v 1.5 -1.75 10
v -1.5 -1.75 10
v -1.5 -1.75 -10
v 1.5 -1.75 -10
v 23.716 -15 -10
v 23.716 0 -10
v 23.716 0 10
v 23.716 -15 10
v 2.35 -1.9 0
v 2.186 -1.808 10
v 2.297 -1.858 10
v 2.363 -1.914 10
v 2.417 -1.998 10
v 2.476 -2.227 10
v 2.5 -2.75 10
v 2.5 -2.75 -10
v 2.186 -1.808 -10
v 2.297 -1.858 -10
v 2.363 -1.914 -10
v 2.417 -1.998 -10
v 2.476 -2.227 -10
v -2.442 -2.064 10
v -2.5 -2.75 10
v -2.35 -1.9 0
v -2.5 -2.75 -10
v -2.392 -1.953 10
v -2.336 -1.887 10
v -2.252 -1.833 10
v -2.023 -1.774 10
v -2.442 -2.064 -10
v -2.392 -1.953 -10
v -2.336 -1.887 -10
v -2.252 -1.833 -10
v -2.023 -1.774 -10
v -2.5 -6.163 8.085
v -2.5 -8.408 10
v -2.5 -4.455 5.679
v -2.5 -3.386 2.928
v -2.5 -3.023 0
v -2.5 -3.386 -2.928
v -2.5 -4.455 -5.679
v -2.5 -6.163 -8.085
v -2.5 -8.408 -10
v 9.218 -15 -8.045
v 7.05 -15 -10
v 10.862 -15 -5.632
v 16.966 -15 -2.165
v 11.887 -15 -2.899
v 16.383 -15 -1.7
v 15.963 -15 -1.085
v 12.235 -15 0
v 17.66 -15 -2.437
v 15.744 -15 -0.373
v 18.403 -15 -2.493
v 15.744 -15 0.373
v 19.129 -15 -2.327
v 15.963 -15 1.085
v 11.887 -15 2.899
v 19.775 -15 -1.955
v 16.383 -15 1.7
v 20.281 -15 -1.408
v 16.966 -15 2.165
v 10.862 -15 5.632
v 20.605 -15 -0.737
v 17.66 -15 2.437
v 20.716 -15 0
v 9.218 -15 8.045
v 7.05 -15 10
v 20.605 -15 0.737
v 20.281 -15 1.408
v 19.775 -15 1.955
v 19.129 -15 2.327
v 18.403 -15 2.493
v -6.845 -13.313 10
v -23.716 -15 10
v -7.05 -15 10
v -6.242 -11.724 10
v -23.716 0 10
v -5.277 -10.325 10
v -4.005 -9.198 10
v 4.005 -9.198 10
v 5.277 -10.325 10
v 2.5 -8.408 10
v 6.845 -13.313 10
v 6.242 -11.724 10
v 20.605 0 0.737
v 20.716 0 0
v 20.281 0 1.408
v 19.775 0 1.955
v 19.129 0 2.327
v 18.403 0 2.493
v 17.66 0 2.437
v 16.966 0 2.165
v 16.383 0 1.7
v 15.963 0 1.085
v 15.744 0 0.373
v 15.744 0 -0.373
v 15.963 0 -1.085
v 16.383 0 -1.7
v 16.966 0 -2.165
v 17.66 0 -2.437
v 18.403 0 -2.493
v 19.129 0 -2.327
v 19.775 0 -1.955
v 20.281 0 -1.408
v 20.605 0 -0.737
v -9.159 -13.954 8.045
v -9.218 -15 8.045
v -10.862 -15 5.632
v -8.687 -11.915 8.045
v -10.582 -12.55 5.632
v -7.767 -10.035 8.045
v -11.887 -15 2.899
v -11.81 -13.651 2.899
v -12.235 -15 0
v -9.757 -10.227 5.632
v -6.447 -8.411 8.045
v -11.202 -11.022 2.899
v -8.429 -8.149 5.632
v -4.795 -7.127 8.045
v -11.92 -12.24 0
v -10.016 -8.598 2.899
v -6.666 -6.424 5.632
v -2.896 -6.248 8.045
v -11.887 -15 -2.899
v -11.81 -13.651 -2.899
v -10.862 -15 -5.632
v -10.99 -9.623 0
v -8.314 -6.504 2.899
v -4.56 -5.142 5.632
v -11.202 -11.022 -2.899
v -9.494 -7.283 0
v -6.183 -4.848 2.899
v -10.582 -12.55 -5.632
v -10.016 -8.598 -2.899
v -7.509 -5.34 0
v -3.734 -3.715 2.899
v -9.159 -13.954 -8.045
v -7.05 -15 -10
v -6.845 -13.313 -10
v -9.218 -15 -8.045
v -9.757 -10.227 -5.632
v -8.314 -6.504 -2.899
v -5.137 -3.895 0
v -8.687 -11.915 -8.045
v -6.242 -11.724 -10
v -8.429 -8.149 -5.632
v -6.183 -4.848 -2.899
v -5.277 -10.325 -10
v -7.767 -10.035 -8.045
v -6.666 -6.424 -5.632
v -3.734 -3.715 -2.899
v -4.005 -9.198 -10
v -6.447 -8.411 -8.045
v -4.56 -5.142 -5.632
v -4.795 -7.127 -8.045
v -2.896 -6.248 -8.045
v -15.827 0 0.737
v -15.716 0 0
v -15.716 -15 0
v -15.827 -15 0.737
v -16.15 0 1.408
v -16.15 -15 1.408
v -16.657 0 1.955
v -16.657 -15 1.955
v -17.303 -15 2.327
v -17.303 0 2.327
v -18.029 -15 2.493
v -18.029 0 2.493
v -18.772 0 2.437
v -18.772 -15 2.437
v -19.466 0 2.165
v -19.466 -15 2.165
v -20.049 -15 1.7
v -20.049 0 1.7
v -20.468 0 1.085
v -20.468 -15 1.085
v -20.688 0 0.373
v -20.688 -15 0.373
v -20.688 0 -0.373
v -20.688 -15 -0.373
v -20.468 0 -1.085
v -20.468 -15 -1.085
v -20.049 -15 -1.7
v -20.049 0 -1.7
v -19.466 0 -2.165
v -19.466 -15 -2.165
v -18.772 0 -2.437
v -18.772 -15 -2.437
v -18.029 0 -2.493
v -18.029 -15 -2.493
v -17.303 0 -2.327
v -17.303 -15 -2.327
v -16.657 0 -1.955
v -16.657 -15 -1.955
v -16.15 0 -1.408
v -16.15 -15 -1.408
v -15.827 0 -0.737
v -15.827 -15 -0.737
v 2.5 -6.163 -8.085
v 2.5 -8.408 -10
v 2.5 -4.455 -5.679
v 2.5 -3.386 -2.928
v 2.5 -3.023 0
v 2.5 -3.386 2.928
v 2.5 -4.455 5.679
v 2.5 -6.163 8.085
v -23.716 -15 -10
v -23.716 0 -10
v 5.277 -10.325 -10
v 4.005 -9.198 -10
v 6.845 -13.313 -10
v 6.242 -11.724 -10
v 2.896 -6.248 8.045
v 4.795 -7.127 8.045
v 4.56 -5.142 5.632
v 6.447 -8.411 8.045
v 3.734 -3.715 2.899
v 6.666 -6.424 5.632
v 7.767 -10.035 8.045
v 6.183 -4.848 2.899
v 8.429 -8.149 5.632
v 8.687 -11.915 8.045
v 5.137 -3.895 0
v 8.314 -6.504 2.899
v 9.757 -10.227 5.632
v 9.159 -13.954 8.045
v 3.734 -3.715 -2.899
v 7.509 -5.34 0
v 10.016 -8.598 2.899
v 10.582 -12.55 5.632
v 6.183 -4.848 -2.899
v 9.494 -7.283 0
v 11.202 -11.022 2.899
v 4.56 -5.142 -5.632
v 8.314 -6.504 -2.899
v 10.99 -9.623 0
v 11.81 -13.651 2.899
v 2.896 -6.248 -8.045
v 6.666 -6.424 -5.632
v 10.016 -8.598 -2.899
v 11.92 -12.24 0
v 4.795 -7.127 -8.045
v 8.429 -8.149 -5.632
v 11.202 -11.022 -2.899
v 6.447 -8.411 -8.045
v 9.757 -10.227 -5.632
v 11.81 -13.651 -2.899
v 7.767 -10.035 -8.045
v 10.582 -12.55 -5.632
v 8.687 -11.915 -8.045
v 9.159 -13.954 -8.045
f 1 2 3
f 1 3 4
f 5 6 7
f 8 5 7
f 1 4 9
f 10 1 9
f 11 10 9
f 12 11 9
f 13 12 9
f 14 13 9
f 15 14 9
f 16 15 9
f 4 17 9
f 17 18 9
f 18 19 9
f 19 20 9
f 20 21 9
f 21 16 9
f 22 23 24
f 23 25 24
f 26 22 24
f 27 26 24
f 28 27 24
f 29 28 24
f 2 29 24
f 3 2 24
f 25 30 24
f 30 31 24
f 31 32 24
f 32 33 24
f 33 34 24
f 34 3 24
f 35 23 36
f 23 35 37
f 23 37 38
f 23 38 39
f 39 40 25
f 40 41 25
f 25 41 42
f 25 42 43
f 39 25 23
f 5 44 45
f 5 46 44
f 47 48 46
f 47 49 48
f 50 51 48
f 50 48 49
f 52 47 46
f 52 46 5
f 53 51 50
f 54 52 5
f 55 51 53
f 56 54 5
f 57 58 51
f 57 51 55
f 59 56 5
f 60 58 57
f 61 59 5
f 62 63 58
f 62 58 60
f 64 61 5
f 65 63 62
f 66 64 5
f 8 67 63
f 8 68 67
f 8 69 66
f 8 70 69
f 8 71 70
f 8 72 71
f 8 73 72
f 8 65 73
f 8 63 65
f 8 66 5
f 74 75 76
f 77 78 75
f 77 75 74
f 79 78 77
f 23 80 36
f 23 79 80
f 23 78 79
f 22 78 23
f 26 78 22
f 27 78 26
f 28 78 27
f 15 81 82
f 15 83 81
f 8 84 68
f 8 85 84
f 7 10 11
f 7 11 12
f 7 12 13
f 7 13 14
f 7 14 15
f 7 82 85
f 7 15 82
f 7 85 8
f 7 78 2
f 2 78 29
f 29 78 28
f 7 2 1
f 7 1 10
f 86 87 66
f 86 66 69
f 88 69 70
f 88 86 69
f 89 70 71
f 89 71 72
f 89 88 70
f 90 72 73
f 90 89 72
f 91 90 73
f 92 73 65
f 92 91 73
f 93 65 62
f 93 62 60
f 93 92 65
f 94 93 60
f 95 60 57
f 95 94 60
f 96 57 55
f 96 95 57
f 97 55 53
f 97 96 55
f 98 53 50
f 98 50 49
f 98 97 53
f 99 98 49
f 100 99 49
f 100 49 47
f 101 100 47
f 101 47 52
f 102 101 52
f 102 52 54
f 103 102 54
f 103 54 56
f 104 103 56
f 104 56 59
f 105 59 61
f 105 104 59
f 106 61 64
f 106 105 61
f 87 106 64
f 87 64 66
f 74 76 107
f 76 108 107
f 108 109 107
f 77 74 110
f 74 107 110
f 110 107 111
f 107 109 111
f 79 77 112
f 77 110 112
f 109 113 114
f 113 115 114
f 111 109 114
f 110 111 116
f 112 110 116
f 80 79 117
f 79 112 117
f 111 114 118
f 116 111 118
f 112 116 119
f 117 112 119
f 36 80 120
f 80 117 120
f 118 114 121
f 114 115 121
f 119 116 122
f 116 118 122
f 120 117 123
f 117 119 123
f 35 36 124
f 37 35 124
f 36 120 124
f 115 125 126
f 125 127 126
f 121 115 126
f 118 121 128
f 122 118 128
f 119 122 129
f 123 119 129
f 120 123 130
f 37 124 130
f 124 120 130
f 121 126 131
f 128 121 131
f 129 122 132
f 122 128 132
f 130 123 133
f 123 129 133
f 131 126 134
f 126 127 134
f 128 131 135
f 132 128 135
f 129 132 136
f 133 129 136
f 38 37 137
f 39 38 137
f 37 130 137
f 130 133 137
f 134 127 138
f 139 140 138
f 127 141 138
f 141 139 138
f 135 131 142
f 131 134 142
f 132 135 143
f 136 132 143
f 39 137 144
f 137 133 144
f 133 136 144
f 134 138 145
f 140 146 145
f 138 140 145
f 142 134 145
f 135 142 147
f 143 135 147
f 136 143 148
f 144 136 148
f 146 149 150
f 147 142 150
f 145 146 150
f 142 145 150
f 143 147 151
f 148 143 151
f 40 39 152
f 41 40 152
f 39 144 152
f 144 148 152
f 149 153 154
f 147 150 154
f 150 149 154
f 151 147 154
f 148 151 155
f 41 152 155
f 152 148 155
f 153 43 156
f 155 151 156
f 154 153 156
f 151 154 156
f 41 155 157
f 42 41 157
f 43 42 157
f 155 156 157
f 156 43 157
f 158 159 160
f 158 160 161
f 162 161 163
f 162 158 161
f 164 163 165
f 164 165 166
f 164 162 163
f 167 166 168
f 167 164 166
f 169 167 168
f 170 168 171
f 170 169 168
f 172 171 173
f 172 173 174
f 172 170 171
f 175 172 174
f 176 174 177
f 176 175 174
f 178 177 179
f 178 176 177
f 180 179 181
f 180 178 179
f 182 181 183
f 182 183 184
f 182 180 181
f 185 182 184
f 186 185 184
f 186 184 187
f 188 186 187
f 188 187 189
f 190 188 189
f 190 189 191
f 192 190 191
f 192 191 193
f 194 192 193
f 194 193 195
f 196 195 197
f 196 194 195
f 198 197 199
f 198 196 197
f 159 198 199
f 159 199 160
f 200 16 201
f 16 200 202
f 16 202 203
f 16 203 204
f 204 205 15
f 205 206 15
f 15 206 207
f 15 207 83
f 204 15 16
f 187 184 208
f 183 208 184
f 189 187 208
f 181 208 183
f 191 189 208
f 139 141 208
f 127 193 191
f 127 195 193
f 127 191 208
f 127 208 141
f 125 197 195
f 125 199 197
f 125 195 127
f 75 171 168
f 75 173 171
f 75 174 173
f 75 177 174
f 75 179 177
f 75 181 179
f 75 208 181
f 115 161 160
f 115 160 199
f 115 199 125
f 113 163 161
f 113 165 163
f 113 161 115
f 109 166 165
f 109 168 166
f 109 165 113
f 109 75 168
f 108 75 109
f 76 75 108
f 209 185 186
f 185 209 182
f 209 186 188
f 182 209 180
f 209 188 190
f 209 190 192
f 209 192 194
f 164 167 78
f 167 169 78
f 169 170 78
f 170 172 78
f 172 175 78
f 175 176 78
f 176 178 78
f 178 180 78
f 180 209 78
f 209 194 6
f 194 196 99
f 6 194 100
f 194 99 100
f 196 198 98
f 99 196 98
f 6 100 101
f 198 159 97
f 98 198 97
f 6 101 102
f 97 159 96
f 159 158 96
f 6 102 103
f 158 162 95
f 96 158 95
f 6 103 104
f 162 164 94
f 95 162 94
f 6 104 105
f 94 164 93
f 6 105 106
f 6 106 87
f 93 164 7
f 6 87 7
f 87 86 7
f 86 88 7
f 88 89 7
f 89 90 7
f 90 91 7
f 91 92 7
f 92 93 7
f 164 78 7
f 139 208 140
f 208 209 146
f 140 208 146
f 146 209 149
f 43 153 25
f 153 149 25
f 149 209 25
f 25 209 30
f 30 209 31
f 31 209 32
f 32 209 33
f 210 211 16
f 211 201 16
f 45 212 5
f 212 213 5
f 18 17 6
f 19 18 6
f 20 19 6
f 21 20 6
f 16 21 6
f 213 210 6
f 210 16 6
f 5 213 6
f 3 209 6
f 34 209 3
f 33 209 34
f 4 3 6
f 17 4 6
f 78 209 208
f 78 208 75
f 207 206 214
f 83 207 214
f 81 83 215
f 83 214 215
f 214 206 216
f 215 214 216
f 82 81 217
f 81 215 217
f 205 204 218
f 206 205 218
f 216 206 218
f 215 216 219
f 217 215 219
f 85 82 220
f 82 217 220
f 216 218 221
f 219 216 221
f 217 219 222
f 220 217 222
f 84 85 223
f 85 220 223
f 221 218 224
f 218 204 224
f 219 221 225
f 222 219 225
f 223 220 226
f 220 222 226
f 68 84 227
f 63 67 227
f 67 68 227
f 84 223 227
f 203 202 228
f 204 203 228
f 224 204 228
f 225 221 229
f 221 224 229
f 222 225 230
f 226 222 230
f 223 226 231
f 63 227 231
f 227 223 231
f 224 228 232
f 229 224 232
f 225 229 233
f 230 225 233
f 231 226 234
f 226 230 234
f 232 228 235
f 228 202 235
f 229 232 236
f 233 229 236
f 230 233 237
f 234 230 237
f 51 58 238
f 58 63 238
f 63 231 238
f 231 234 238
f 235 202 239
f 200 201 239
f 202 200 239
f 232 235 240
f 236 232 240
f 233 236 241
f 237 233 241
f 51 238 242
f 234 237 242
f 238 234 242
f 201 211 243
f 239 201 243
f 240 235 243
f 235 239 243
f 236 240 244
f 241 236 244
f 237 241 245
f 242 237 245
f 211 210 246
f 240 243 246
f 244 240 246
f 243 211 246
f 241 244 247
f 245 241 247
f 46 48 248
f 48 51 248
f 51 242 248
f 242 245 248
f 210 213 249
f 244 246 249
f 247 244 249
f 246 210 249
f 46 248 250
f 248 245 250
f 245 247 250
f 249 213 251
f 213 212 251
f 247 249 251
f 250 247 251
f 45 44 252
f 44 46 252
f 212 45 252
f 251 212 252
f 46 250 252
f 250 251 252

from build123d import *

# Parameters (mm, degrees)
F0_W        = 47.4317967892
F0_H        = 20
F0_R        = 4.5
F1_DEPTH    = 15
F2_R        = 7.05
F3_DEPTH    = 25
F7_DEPTH    = 13.25
F8_T1_DEPTH = 20
F0_R_2      = 2.5
F9_DEPTH    = 15


# Not quite as in the source:
# - a fillet or chamfer that OpenCascade refuses, or shapes differently, is made with other operations: its cross-section is extruded or revolved along the edge and cut away or added


with BuildPart() as f1:
    # F0 (on Front) → F1 (new body)
    with BuildSketch(Plane.XZ):
        Rectangle(F0_W, F0_H)
        with Locations((-18.2158983946, 0)):
            Circle(F0_R, mode=Mode.SUBTRACT)
        with Locations((18.2158983946, 0)):
            Circle(F0_R, mode=Mode.SUBTRACT)
    extrude(amount=F1_DEPTH)

    # F2 (on face) → F3 (cut)
    with BuildSketch(Plane.XY.offset(10)):
        with Locations((0, -15)):
            Circle(F2_R)
    extrude(amount=-F3_DEPTH, mode=Mode.SUBTRACT)

    # F4 (on face) → F5 (revolve, cut)
    with BuildSketch(Plane.XZ.offset(15)):
        with BuildLine():
            Line((-7.05, -10), (-7.05, 10))
            ThreePointArc((-7.05, 10), (-12.2352972992, 0), (-7.05, -10))
        make_face()
    revolve(axis=Axis((0, -15, 0.0368109904), (0, 0, -1)), mode=Mode.SUBTRACT)

    # F6 (on face) → F7 (cut)
    with BuildSketch(Plane.XZ.offset(15)):
        Polygon((2.5, -10.0813228637), (2.5, 10), (0, 10), (-2.5, 10), (-2.5, -10.0813228637), (0, -10.0813228637), align=None)
    extrude(amount=-F7_DEPTH, mode=Mode.SUBTRACT)

    # F8: fillet of radius 1 on 2 edges, made by hand

    # F8_s2 → F8_t1 (join)
    with BuildSketch(Plane.XY.offset(-10)):
        with BuildLine():
            add(Edge.make_bspline(
                [(1.5, -1.75), (2.5, -1.75), (2.5, -2.75)],
                knots=[0, 0, 0, 1, 1, 1], degree=2, weights=[1, 2.3333333333, 1]))
            Line((2.5, -2.75), (2.5, -1.75))
            Line((2.5, -1.75), (1.5, -1.75))
        make_face()
        with BuildLine():
            add(Edge.make_bspline(
                [(-2.5, -2.75), (-2.5, -1.75), (-1.5, -1.75)],
                knots=[0, 0, 0, 1, 1, 1], degree=2, weights=[1, 2.3333333333, 1]))
            Line((-1.5, -1.75), (-2.5, -1.75))
            Line((-2.5, -1.75), (-2.5, -2.75))
        make_face()
    extrude(amount=F8_T1_DEPTH)

    # F0 (on Front) → F9 (join)
    with BuildSketch(Plane.XZ):
        with Locations((-18.2158983946, 0)):
            Circle(F0_R)
        with Locations((-18.2158983946, 0)):
            Circle(F0_R_2, mode=Mode.SUBTRACT)
        with Locations((18.2158983946, 0)):
            Circle(F0_R)
        with Locations((18.2158983946, 0)):
            Circle(F0_R_2, mode=Mode.SUBTRACT)
    extrude(amount=F9_DEPTH)


solid = f1.part
